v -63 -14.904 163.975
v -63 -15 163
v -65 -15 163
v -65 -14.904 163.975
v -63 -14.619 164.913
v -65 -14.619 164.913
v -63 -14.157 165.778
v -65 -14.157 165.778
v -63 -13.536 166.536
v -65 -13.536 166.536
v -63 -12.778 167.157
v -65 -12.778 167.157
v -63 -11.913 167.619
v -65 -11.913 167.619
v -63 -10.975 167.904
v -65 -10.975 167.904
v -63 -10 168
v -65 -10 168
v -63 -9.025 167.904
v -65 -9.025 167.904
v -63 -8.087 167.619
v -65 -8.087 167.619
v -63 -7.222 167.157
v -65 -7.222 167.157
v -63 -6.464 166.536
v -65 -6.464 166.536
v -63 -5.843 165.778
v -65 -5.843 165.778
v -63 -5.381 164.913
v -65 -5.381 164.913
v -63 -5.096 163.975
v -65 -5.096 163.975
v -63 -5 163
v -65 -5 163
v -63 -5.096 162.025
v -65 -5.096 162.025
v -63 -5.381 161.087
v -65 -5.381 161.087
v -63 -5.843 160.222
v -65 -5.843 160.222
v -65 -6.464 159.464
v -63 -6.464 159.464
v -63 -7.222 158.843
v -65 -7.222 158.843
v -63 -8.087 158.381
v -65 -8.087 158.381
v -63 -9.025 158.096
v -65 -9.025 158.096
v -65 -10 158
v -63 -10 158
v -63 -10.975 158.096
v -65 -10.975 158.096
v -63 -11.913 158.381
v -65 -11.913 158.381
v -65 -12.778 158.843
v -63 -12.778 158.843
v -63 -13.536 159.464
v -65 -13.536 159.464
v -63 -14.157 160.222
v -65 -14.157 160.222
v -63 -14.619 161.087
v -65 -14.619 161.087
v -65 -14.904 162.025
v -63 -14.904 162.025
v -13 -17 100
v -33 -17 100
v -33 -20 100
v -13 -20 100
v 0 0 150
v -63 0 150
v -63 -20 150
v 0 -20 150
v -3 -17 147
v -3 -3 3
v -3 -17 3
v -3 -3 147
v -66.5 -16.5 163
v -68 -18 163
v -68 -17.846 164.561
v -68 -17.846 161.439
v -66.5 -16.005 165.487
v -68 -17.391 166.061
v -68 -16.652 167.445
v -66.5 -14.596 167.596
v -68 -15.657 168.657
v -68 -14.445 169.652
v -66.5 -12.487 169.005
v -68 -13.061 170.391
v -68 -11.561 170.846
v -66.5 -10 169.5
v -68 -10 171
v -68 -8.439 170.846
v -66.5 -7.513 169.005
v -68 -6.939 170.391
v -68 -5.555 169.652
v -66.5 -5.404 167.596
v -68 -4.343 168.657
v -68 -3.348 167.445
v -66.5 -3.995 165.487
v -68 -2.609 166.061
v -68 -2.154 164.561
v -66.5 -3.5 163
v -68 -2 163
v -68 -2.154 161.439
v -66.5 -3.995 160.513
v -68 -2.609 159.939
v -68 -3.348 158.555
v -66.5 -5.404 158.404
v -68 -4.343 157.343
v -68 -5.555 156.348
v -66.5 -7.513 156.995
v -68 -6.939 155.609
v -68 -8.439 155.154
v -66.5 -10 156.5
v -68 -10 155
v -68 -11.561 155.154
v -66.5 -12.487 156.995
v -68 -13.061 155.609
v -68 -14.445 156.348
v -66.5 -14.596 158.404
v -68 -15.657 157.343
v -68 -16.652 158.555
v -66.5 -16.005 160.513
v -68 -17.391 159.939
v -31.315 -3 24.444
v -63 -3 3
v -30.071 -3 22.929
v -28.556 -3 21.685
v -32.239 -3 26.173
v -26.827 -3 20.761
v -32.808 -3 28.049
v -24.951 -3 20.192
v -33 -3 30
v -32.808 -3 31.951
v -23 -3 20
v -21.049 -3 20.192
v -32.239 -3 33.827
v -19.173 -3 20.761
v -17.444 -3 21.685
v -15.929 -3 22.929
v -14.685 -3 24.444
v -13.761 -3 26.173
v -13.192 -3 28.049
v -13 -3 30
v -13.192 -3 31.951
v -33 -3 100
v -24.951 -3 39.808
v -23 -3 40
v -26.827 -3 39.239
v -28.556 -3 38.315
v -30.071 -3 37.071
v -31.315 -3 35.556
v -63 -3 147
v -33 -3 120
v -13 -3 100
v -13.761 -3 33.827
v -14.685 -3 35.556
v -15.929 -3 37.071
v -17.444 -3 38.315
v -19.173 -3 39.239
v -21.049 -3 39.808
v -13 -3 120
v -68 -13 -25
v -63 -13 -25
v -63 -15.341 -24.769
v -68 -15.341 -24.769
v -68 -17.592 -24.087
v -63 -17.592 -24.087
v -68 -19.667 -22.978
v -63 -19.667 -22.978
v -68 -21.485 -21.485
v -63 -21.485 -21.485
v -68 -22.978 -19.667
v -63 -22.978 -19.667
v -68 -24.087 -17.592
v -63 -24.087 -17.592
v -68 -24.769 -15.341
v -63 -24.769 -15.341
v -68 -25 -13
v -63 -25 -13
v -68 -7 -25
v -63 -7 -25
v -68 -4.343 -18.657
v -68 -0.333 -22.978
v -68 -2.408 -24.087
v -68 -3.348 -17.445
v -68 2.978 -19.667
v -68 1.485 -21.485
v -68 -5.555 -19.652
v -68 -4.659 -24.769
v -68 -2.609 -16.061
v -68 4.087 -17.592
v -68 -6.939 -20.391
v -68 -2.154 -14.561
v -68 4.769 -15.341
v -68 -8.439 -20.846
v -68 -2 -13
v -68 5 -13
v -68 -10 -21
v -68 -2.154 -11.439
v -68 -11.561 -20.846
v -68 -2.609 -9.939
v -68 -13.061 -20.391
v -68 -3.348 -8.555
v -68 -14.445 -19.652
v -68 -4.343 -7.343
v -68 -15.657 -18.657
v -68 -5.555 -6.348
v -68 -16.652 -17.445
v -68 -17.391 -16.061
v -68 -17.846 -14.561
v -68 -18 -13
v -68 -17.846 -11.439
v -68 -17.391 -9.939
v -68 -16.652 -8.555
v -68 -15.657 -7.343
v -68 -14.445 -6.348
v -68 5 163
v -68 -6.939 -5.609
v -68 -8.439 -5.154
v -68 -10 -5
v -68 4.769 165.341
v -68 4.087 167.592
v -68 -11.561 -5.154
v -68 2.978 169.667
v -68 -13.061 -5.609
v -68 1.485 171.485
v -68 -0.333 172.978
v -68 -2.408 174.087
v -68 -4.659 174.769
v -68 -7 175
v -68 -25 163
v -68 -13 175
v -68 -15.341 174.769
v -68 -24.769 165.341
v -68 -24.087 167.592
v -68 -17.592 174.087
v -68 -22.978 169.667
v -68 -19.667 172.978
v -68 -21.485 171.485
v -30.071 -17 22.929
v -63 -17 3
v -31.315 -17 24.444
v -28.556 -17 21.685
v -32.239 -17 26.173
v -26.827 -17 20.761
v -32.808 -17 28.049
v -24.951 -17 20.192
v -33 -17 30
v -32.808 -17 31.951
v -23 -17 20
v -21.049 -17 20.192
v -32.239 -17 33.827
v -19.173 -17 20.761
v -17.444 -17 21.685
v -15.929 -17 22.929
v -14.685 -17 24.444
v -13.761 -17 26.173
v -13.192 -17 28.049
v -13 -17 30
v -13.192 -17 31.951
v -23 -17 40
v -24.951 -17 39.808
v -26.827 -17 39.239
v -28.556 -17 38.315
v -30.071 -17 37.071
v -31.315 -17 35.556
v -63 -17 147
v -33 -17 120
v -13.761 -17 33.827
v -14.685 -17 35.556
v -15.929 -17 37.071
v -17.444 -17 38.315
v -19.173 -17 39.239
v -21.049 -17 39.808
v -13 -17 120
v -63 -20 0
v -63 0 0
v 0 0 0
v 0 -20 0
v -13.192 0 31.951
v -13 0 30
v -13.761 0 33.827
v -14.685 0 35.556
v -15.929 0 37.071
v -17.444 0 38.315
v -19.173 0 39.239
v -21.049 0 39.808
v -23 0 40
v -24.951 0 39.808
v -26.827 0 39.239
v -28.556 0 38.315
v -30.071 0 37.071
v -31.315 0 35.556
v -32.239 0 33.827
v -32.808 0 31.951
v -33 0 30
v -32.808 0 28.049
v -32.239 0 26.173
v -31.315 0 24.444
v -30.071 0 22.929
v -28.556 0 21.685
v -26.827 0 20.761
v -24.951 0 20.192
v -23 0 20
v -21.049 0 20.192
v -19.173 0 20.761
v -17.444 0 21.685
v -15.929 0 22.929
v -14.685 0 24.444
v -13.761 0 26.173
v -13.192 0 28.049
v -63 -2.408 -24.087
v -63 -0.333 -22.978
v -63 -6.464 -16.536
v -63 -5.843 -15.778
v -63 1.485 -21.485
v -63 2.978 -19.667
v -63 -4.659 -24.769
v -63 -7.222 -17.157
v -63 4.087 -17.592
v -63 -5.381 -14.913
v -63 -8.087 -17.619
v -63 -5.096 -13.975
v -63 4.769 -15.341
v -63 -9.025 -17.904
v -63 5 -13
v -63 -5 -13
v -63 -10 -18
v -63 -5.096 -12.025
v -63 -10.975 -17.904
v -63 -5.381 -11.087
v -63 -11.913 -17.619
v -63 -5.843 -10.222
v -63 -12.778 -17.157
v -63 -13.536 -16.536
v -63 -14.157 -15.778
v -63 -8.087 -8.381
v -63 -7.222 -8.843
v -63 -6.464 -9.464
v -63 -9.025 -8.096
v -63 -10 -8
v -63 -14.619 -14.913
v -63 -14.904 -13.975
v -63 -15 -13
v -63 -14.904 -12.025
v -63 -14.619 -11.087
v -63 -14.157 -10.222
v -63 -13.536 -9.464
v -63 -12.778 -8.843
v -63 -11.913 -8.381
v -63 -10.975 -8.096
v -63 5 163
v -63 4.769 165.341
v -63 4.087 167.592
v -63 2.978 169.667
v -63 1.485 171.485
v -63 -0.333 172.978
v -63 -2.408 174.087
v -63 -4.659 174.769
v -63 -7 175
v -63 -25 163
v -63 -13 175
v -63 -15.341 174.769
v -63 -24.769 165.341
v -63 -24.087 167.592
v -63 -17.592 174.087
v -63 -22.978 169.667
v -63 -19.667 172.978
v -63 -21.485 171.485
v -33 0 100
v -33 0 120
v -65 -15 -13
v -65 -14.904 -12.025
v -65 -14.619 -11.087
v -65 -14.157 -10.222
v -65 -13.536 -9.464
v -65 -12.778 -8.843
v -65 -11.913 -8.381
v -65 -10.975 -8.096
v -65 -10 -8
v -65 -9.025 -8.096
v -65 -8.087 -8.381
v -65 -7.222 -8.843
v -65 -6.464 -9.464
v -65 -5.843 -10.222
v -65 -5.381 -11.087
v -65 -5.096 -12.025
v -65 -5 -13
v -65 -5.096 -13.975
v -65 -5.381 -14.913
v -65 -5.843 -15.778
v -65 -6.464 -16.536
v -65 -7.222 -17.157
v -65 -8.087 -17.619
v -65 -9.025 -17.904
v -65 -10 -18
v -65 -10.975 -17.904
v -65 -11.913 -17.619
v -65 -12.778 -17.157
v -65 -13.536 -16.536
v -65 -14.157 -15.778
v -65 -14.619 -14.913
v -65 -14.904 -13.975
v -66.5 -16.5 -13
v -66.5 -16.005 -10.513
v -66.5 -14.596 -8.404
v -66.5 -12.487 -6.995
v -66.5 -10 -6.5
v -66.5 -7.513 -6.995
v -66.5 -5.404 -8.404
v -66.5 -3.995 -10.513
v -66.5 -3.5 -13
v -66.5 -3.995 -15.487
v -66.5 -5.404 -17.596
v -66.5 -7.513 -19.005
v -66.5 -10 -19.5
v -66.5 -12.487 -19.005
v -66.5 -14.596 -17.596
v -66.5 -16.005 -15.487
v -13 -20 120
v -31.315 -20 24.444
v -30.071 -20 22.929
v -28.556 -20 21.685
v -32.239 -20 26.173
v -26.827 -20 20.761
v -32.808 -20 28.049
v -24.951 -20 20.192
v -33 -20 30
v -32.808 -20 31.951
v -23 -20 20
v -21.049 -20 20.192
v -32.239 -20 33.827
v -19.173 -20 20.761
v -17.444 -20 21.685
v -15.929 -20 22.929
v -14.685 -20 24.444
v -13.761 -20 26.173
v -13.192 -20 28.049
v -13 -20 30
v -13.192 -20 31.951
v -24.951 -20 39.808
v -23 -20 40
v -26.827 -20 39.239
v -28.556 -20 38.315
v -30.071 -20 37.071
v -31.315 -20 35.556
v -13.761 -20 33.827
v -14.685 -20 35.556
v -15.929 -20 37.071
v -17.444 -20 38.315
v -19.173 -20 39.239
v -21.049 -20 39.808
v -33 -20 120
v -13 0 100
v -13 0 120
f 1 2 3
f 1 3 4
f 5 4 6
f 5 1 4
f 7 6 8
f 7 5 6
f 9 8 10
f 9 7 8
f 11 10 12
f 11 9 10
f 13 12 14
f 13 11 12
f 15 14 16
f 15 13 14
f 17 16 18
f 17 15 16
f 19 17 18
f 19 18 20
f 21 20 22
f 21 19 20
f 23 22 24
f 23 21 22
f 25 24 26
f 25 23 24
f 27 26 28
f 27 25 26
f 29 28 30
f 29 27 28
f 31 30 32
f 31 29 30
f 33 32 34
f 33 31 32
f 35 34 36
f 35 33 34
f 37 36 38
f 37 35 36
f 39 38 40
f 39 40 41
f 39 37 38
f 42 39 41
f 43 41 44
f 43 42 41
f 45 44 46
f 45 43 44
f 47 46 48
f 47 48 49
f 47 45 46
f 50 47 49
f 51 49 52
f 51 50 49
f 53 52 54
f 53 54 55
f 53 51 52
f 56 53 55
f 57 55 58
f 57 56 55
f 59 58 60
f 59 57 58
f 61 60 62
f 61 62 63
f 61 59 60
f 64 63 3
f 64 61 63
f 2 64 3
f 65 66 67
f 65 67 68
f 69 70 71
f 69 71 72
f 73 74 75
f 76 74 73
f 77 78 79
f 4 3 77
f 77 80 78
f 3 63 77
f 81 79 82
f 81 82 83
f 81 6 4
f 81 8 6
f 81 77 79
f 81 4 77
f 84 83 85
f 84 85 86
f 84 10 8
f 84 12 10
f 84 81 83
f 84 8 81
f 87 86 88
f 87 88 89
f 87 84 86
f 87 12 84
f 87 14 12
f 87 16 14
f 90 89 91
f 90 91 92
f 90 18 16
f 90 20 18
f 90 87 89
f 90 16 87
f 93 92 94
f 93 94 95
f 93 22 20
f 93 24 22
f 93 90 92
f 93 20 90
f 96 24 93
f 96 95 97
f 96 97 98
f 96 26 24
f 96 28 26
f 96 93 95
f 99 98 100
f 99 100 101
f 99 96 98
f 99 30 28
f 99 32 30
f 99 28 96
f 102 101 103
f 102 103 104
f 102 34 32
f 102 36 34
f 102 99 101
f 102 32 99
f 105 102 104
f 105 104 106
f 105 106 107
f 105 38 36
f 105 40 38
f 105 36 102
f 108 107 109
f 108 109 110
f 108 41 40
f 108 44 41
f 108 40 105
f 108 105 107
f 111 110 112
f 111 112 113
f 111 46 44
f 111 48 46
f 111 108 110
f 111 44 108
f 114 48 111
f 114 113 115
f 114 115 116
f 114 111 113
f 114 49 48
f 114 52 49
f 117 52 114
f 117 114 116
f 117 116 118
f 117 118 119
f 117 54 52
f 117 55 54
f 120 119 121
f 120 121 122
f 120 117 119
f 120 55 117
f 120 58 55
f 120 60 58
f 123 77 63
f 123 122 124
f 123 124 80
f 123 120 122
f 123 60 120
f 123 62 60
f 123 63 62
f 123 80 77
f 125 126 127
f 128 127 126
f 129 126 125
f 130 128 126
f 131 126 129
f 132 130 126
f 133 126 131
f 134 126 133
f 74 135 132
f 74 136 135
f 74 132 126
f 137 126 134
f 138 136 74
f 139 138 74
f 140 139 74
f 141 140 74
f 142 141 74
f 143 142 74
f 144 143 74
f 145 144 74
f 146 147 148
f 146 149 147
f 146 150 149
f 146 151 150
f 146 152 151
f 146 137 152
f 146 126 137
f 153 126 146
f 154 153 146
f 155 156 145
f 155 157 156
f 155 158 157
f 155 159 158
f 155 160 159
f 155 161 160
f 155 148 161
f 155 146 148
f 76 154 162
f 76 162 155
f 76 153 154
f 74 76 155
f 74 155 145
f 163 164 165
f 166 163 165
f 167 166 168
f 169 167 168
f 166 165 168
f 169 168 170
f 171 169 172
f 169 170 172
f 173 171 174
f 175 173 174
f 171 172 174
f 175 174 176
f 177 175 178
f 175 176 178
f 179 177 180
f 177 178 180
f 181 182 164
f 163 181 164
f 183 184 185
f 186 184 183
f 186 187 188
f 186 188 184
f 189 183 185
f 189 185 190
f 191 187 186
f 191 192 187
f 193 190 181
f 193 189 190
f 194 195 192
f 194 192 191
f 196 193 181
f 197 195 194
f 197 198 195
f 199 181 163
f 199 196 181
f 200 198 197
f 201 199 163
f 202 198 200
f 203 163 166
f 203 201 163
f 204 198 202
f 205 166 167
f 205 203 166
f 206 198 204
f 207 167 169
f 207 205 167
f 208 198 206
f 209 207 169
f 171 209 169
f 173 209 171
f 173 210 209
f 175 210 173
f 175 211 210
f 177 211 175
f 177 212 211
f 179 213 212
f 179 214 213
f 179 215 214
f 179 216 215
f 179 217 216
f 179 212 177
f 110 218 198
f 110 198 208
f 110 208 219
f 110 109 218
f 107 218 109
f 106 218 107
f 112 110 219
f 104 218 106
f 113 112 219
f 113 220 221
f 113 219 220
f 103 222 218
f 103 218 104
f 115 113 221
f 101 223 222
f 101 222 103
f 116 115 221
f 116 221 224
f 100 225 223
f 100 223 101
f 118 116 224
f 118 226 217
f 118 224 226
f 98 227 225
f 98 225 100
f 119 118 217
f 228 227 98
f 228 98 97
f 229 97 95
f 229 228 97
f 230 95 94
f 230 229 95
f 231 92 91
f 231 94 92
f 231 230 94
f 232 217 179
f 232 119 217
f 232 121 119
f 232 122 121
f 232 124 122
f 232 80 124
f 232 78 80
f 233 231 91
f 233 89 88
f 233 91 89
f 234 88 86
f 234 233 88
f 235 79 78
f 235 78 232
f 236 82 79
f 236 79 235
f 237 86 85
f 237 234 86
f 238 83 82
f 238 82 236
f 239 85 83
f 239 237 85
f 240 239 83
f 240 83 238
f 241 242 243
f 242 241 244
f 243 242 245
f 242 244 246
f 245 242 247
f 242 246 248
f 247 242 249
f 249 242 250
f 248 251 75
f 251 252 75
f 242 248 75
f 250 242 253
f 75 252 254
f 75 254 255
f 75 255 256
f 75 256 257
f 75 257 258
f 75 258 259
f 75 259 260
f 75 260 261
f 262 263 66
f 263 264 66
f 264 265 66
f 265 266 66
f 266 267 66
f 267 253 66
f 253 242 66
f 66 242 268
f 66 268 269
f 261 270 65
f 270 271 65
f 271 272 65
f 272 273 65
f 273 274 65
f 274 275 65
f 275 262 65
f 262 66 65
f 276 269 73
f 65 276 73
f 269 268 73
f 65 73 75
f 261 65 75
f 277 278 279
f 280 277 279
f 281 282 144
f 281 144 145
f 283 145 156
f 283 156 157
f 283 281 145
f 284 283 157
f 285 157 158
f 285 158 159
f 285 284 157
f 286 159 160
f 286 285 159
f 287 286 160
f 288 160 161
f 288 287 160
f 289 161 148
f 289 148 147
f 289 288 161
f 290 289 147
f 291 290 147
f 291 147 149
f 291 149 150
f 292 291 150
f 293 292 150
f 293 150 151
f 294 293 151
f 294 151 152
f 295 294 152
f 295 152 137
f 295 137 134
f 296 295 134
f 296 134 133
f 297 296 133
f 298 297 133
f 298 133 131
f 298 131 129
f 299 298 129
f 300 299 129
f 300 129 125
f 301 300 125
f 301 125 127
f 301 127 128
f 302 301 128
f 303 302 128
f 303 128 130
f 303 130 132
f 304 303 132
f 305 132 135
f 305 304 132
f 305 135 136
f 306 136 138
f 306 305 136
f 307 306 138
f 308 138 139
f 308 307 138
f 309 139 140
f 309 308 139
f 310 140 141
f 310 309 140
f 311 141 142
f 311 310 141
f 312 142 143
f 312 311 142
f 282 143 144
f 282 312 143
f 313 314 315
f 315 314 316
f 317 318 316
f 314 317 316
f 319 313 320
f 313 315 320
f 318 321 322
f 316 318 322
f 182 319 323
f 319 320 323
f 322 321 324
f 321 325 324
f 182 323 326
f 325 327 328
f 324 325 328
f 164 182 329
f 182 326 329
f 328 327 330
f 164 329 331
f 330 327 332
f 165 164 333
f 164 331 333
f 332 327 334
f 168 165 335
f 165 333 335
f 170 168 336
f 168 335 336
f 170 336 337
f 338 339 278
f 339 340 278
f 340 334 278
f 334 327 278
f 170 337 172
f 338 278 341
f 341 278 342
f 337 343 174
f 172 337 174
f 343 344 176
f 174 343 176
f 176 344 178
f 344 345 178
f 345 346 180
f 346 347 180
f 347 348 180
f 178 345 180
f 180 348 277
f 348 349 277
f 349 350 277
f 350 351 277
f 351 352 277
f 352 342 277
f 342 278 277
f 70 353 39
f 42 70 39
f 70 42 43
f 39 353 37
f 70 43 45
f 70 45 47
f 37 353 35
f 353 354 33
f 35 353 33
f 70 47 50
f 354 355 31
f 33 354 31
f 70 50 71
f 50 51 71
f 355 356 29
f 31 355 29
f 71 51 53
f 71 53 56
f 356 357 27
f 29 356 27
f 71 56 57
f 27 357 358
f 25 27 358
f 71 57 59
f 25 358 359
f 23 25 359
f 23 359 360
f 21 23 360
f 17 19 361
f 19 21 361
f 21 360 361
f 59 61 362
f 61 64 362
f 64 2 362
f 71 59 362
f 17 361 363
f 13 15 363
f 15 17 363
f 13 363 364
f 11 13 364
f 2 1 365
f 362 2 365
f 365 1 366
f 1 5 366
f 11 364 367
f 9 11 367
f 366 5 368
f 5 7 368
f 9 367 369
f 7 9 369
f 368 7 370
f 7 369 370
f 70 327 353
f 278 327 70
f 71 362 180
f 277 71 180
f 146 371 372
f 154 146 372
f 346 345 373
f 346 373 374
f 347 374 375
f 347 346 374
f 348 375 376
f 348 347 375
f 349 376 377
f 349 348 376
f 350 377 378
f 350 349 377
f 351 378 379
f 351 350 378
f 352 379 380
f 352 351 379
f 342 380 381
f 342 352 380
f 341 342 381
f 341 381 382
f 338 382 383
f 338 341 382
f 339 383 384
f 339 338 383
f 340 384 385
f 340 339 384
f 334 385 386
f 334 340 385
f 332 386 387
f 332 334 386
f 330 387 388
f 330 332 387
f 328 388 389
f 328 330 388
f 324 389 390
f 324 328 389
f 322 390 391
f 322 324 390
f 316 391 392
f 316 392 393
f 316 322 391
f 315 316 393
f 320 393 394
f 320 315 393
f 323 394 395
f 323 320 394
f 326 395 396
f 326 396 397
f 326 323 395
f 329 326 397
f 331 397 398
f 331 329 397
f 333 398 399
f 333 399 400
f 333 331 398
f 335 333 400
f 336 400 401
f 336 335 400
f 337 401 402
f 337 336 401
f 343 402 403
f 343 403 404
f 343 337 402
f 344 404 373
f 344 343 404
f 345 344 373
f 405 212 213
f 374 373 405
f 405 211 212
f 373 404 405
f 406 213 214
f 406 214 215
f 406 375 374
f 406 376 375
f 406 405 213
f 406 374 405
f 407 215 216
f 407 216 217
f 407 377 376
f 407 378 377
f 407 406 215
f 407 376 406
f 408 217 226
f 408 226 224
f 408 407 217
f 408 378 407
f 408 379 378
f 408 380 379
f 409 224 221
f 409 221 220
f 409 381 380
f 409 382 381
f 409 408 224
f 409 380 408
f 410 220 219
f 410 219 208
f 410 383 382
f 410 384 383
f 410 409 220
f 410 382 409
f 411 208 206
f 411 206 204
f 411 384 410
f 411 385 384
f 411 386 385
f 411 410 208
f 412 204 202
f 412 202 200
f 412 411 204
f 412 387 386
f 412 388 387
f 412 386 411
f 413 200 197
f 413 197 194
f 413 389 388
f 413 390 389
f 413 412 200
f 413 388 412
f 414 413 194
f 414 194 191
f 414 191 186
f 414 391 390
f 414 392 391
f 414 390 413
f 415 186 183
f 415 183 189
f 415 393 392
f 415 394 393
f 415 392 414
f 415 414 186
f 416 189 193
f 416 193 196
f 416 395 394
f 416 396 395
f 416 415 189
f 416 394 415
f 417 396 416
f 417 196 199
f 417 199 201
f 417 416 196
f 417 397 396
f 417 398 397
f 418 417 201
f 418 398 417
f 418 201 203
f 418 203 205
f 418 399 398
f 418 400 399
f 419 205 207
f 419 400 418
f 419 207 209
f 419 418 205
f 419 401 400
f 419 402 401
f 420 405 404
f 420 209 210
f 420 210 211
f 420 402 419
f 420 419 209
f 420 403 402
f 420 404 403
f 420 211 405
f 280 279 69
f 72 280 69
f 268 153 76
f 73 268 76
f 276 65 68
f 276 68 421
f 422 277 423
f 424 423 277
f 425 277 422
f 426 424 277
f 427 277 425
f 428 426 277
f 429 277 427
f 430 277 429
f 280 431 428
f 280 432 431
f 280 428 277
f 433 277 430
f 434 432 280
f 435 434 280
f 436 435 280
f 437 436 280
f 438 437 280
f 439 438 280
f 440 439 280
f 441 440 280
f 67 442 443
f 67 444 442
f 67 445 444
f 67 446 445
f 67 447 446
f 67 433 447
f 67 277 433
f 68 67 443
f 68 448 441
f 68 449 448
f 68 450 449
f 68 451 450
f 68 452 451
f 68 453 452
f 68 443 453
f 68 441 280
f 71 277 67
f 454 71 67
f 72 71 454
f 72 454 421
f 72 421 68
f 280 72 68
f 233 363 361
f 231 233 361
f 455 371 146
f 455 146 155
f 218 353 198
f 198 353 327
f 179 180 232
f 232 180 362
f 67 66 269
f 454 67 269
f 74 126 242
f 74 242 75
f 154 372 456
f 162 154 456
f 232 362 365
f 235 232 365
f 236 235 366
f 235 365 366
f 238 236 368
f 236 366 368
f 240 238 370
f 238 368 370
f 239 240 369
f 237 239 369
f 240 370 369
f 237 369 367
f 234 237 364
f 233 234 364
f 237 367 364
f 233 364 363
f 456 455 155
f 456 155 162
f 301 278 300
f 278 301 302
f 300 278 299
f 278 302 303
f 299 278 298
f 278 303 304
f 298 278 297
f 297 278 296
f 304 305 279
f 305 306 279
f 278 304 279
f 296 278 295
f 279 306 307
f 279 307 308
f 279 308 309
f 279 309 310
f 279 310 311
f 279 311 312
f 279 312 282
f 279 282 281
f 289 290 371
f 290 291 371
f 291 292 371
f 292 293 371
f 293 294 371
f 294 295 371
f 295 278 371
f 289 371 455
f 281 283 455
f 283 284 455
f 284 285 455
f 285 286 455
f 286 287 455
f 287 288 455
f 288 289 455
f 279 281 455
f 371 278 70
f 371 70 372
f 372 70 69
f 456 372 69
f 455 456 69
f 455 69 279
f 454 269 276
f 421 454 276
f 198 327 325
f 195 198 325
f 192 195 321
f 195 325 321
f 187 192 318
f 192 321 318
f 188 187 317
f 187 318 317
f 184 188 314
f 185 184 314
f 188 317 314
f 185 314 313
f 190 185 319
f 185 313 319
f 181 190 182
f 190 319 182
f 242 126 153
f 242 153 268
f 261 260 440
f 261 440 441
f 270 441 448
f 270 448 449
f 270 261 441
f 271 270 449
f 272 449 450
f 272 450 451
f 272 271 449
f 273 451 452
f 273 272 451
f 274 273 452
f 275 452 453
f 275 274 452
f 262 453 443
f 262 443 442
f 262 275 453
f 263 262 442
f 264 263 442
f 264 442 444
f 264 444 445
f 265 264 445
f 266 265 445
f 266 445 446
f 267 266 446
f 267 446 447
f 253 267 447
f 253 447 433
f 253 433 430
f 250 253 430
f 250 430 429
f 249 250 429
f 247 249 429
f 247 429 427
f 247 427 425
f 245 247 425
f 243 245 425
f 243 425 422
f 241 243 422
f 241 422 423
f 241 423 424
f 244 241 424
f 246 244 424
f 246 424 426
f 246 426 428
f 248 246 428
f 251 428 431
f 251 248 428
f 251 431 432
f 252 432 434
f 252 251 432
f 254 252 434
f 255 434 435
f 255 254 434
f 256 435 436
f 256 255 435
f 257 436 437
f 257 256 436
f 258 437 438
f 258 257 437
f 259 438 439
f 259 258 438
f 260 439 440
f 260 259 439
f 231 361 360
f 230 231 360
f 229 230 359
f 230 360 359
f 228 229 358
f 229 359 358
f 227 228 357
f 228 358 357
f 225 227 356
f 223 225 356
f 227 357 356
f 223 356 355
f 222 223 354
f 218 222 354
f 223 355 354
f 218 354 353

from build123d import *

# Parameters (mm, degrees)
F0_W     = 63
F0_H     = 150
F0_R     = 10
F0_W_2   = 20
F0_H_2   = 20
F1_DEPTH = 20
F2_T     = -3
F3_R     = 5
F4_DEPTH = 5
F5_SIZE  = 3


with BuildPart() as f1:
    # F0 (on Front) → F1 (new body)
    with BuildSketch(Plane.XZ):
        with Locations((-31.5, 75)):
            Rectangle(F0_W, F0_H)
        with Locations((-23, 30)):
            Circle(F0_R, mode=Mode.SUBTRACT)
        with Locations((-23, 110)):
            Rectangle(F0_W_2, F0_H_2, mode=Mode.SUBTRACT)
    extrude(amount=F1_DEPTH)

    # F2
    f2_openings = [f1.faces().sort_by_distance(p)[0] for p in [
        (-63, -10, 75),
        (-13, -10, 110),
        (-23, -10, 100),
        (-33, -10, 110),
        (-23, -10, 120),
        (-33, -10, 30),
    ]]
    offset(amount=F2_T, openings=f2_openings)

    # F3 (on face) → F4 (join)
    with BuildSketch(Plane(origin=(-63, 0, 0), x_dir=(0, -1, 0), z_dir=(-1, 0, 0))):
        with BuildLine():
            ThreePointArc((25, 163), (21.485281, 171.485281), (13, 175))
            Line((13, 175), (7, 175))
            ThreePointArc((7, 175), (-1.485281, 171.485281), (-5, 163))
            Line((-5, 163), (-5, -13))
            ThreePointArc((-5, -13), (-1.485281, -21.485281), (7, -25))
            Line((7, -25), (13, -25))
            ThreePointArc((13, -25), (21.485281, -21.485281), (25, -13))
            Line((25, -13), (25, 163))
        make_face()
        with Locations((10, -13)):
            Circle(F3_R, mode=Mode.SUBTRACT)
        with Locations((10, 163)):
            Circle(F3_R, mode=Mode.SUBTRACT)
    extrude(amount=F4_DEPTH)

    # F5
    f5_edges = [f1.edges().sort_by_distance(p)[0] for p in [
        (-68, -5, 163),
        (-68, -5, -13),
    ]]
    chamfer(f5_edges, length=F5_SIZE)


solid = f1.part
